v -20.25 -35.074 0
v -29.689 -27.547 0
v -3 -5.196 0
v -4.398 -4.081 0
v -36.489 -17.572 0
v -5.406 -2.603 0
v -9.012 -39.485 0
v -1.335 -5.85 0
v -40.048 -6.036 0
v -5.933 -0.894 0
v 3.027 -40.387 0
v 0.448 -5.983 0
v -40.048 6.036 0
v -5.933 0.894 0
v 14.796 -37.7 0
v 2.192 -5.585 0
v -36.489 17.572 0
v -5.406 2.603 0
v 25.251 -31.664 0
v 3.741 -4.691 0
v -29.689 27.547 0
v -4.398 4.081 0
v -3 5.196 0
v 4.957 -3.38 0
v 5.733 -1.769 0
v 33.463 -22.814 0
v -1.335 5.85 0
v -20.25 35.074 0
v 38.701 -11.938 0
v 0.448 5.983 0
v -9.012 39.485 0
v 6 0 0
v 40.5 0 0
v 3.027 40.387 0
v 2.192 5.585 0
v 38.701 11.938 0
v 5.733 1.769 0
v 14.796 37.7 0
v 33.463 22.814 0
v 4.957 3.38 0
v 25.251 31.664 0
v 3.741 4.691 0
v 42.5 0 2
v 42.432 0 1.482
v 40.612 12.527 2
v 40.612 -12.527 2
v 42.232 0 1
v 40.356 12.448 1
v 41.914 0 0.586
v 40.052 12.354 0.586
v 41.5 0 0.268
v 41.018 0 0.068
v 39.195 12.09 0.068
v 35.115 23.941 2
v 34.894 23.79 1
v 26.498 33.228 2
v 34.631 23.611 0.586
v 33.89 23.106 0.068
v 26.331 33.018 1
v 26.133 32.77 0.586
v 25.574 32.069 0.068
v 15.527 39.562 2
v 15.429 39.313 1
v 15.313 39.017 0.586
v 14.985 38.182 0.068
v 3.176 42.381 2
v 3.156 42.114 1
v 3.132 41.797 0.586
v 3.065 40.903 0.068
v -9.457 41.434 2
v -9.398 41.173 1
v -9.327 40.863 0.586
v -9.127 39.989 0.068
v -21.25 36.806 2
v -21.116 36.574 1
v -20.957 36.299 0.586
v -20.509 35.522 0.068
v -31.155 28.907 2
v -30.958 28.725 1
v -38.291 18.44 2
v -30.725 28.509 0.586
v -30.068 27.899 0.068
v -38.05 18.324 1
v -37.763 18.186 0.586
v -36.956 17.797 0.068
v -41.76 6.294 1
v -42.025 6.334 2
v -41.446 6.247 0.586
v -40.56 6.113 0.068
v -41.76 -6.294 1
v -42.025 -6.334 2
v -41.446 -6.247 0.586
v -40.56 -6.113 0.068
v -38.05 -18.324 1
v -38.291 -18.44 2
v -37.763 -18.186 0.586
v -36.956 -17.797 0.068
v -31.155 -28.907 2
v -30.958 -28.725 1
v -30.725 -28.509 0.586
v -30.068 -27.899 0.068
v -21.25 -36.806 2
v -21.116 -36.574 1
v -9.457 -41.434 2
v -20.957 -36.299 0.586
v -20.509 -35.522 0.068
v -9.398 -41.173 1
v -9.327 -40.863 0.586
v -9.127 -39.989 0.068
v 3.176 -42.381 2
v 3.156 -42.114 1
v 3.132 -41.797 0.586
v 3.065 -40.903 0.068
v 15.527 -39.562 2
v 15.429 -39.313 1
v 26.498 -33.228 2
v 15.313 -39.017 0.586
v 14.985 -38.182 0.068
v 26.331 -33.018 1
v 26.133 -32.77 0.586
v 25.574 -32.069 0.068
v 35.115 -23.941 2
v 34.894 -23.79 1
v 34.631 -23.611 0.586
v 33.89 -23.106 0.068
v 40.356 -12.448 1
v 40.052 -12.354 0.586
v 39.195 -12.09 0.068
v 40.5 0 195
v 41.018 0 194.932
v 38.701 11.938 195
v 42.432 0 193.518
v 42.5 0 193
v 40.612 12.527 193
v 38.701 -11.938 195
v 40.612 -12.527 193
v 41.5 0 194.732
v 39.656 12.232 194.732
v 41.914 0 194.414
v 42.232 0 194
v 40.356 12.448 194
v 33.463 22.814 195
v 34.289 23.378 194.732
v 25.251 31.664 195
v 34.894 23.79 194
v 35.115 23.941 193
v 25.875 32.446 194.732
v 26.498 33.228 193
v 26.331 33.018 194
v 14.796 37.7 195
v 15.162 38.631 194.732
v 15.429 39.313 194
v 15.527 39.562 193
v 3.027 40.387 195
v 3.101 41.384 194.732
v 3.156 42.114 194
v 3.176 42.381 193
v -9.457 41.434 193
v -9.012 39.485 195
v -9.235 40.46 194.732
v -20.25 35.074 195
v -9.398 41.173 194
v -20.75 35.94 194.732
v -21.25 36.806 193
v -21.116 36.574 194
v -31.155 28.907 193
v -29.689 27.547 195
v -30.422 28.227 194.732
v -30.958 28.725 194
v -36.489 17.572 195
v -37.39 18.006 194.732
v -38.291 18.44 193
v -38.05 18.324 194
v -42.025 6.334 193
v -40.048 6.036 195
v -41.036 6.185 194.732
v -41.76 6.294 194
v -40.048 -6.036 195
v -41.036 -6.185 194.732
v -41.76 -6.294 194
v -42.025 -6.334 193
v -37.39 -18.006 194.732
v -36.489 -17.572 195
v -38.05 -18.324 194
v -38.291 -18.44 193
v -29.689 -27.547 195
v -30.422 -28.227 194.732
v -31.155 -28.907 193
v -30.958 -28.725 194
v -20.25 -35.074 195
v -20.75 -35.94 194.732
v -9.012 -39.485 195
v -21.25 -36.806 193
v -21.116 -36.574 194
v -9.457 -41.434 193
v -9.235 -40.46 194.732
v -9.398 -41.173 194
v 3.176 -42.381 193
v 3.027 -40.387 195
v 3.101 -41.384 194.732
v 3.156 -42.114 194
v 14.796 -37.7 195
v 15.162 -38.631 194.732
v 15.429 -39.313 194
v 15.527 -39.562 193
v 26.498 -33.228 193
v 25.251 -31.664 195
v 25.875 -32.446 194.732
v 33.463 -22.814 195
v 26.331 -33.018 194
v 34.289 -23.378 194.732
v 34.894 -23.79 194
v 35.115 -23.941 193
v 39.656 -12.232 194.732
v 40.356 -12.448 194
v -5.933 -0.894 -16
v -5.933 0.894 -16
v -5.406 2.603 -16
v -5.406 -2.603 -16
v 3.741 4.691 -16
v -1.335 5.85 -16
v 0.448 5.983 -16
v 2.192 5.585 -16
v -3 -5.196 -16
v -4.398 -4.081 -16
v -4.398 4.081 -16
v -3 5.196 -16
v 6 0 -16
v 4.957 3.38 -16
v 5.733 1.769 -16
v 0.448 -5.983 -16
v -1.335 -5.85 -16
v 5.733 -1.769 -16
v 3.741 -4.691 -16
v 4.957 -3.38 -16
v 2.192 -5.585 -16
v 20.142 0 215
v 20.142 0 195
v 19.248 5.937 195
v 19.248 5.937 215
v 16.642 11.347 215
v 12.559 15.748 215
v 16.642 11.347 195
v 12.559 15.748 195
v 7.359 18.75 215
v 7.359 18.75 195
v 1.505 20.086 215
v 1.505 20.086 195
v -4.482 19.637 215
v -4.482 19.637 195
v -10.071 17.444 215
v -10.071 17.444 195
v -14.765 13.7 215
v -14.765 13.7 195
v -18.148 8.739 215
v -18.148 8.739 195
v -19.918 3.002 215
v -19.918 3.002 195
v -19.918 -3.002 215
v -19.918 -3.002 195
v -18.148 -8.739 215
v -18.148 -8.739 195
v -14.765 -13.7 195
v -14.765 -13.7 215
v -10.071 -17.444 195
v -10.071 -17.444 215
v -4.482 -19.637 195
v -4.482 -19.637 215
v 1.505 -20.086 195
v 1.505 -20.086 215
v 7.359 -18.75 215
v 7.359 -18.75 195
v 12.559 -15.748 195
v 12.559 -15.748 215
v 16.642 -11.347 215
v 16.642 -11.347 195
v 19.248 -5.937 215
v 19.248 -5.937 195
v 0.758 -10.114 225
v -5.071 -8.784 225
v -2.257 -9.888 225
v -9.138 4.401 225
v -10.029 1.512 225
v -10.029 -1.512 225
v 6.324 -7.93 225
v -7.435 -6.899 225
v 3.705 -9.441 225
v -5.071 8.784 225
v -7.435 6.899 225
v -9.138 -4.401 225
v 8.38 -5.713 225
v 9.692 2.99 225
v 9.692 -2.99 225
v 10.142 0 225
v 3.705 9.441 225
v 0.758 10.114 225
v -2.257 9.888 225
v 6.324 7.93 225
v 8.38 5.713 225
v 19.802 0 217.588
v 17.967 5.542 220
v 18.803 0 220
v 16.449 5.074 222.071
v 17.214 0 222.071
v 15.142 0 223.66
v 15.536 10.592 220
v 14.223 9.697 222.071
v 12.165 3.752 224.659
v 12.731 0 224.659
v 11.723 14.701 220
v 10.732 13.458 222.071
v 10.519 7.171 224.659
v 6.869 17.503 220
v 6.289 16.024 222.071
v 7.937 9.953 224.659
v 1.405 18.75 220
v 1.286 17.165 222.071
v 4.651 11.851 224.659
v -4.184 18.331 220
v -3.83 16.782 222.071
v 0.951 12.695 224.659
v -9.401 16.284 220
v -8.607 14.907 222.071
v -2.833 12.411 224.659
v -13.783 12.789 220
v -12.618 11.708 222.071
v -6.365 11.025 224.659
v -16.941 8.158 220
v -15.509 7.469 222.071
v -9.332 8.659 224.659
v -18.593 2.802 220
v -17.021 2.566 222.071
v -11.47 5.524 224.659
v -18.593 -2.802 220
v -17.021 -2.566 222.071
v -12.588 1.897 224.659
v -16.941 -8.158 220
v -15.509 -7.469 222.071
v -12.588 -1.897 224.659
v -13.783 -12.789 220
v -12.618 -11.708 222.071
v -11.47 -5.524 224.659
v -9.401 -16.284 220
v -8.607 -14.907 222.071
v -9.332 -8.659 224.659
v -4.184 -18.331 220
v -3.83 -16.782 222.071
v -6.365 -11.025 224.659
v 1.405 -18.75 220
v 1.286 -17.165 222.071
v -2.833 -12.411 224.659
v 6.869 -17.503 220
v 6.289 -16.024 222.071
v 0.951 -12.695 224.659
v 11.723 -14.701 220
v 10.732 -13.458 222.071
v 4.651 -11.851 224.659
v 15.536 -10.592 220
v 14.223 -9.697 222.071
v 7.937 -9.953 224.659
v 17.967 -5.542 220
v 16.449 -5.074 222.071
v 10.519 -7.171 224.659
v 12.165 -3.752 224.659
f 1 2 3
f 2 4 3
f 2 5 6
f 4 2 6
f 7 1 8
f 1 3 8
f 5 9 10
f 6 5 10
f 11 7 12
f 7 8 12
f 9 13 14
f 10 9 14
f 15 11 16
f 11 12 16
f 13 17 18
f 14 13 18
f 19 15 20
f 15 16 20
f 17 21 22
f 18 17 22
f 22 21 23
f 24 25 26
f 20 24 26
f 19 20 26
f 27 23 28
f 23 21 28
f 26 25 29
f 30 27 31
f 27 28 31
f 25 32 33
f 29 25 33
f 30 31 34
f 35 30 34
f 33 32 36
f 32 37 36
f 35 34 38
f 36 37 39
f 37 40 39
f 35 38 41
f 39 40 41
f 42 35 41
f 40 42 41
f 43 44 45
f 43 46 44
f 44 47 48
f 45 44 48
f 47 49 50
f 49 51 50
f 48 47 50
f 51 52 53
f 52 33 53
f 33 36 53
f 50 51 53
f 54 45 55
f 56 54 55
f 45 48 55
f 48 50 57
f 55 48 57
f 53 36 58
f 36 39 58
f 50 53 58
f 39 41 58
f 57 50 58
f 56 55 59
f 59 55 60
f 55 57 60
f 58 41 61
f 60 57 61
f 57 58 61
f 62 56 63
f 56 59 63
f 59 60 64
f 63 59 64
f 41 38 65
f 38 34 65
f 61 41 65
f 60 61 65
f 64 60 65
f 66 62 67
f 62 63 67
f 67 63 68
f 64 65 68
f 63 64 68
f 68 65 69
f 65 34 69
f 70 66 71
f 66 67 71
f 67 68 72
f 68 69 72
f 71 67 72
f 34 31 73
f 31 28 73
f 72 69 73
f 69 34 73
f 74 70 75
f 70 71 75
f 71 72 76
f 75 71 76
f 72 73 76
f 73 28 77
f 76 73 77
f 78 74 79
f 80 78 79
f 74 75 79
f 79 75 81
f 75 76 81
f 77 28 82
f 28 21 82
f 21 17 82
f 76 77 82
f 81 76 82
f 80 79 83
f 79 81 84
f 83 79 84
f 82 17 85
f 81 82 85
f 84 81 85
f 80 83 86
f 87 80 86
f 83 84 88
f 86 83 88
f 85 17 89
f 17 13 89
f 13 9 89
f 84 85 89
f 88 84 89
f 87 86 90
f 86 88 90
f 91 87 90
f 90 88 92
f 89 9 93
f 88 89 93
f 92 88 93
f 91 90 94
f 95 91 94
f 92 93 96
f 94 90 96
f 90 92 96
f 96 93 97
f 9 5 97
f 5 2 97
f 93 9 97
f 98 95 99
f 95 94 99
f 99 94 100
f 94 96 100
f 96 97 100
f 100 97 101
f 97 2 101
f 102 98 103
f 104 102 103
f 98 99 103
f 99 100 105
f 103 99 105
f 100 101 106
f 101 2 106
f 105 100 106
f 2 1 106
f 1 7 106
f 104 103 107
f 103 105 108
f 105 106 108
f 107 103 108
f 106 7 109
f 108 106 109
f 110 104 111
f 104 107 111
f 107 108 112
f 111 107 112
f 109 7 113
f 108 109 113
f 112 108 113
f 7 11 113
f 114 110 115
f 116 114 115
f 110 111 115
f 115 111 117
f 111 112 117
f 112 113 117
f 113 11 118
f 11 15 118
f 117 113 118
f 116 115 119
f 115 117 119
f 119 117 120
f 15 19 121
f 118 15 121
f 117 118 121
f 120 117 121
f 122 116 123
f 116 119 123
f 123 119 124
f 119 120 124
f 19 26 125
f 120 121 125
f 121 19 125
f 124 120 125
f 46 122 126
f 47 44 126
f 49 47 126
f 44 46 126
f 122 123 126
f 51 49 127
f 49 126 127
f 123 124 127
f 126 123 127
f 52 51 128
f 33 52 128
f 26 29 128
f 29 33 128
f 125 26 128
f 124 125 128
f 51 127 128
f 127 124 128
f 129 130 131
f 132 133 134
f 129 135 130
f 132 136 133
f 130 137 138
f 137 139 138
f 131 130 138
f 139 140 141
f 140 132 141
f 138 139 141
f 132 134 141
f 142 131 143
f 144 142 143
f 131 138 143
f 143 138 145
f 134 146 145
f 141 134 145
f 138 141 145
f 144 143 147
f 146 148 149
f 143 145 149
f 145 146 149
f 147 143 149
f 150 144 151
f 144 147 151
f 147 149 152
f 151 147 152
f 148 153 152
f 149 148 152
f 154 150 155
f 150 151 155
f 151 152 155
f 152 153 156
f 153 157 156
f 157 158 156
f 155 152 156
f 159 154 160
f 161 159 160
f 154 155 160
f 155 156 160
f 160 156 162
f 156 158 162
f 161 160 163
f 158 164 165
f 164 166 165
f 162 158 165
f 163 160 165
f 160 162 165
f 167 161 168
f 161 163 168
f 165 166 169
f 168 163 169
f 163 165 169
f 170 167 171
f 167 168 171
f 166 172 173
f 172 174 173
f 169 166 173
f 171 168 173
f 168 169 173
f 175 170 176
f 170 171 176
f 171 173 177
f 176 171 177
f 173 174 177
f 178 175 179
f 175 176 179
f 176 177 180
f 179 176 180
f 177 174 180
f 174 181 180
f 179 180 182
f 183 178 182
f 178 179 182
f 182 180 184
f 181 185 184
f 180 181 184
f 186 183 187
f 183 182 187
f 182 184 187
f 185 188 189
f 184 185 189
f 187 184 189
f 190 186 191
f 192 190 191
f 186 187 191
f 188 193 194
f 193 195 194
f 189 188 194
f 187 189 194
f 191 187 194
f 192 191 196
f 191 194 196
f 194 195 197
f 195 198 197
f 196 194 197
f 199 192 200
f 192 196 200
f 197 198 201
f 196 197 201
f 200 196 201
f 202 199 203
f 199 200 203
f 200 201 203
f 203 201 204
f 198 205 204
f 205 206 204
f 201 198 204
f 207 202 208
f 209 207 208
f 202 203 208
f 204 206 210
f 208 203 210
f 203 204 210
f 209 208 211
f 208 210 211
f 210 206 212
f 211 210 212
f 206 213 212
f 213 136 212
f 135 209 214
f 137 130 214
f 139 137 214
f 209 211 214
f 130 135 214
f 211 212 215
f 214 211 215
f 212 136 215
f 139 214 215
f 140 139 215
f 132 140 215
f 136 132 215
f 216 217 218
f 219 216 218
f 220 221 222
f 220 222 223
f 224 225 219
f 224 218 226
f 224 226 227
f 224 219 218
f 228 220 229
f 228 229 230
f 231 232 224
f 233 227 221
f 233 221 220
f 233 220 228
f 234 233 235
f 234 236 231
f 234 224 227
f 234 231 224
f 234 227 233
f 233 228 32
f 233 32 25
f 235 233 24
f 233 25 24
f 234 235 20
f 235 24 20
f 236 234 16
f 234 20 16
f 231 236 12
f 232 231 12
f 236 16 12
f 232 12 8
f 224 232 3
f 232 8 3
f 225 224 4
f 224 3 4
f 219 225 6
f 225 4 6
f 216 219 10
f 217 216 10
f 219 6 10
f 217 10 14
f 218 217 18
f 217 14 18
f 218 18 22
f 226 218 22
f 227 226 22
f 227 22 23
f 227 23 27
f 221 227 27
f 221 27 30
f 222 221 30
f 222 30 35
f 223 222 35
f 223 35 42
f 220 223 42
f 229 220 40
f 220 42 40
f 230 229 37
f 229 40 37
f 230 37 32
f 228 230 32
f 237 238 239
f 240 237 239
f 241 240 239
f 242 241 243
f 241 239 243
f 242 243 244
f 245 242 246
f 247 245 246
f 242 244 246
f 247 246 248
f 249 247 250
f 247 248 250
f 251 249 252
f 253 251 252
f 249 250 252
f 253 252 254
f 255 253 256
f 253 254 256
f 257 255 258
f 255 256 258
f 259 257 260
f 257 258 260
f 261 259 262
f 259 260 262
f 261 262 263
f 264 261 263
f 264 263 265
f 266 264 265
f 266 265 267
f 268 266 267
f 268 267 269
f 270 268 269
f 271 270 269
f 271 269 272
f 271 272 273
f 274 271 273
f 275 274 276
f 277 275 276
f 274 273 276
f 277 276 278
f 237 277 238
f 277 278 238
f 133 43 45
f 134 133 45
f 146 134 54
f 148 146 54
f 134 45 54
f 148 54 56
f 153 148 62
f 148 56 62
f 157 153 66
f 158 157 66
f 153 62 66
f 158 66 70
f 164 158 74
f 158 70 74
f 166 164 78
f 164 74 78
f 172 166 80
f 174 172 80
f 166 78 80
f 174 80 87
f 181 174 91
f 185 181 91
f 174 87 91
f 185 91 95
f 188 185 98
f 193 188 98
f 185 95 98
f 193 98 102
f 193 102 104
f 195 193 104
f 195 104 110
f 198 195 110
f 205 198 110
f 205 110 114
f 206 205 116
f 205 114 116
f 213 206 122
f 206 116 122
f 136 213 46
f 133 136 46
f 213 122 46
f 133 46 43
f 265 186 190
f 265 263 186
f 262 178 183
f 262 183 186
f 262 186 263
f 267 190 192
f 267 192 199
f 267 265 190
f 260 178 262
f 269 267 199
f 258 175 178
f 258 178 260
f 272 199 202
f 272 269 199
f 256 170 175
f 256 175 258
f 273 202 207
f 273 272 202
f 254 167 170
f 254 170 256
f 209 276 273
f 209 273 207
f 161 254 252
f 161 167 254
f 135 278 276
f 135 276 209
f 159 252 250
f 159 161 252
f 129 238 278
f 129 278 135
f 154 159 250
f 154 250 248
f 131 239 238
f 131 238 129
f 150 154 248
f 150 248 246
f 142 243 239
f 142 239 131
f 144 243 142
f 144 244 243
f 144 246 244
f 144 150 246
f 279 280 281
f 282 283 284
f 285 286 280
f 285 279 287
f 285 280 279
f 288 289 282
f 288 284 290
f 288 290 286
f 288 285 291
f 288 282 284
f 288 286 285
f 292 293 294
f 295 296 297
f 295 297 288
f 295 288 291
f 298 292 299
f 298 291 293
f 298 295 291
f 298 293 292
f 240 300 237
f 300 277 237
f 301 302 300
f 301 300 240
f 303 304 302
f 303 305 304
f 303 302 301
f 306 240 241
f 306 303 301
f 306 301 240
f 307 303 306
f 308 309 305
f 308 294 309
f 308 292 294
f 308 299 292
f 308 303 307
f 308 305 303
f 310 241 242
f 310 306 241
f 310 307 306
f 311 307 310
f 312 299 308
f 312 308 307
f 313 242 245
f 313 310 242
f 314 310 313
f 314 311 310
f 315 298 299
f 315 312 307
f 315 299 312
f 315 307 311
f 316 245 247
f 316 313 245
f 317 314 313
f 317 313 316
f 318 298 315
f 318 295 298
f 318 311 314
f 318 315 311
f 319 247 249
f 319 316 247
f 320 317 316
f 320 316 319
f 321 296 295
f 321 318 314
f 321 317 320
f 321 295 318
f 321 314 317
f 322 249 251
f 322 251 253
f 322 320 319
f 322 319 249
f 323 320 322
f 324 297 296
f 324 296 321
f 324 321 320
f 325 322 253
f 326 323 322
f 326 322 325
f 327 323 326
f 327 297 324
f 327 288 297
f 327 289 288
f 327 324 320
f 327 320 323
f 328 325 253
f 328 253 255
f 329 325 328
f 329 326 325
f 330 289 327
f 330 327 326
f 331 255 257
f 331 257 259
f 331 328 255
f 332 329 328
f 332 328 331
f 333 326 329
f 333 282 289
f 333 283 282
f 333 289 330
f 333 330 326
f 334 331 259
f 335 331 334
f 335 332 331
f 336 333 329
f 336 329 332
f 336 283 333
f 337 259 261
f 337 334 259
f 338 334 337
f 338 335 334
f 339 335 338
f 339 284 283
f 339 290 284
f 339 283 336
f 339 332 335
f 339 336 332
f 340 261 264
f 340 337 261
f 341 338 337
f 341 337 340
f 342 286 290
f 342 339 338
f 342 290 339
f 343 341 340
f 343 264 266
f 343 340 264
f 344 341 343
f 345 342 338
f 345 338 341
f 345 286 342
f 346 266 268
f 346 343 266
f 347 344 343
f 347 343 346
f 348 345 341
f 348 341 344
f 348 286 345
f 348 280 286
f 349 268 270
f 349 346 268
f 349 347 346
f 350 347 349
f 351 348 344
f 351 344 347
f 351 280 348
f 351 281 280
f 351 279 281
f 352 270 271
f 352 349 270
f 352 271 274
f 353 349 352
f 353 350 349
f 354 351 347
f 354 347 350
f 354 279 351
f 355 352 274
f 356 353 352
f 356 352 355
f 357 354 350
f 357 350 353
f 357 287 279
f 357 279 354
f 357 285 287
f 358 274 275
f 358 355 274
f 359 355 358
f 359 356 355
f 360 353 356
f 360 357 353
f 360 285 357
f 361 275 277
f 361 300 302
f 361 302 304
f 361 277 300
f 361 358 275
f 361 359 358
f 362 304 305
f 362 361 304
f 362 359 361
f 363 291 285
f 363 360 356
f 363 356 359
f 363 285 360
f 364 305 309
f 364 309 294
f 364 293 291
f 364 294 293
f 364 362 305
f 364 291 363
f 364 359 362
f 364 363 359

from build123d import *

# Parameters (mm, degrees)
F0_R     = 42.5
F1_DEPTH = 195
F2_R     = 20.142482
F3_DEPTH = 30
F4_R     = 10
F5_R     = 6
F6_DEPTH = 16
F7_R     = 2


with BuildPart() as f1:
    # F0 (on Top) → F1 (new body)
    with BuildSketch(Plane.XY):
        Circle(F0_R)
    extrude(amount=F1_DEPTH)

    # F2 (on face) → F3 (join)
    with BuildSketch(Plane.XY.offset(195)):
        Circle(F2_R)
    extrude(amount=F3_DEPTH)

    # F4
    f4_edges = [f1.edges().sort_by_distance(p)[0] for p in [
        (-20.142482, 0, 225),
    ]]
    fillet(f4_edges, radius=F4_R)

    # F5 (on face) → F6 (join)
    with BuildSketch(Plane(origin=(0, 0, 0), x_dir=(1, 0, 0), z_dir=(0, 0, -1))):
        Circle(F5_R)
    extrude(amount=F6_DEPTH)

    # F7
    f7_edges = [f1.edges().sort_by_distance(p)[0] for p in [
        (-42.5, 0, 195),
        (-42.5, 0, 0),
    ]]
    fillet(f7_edges, radius=F7_R)


solid = f1.part
